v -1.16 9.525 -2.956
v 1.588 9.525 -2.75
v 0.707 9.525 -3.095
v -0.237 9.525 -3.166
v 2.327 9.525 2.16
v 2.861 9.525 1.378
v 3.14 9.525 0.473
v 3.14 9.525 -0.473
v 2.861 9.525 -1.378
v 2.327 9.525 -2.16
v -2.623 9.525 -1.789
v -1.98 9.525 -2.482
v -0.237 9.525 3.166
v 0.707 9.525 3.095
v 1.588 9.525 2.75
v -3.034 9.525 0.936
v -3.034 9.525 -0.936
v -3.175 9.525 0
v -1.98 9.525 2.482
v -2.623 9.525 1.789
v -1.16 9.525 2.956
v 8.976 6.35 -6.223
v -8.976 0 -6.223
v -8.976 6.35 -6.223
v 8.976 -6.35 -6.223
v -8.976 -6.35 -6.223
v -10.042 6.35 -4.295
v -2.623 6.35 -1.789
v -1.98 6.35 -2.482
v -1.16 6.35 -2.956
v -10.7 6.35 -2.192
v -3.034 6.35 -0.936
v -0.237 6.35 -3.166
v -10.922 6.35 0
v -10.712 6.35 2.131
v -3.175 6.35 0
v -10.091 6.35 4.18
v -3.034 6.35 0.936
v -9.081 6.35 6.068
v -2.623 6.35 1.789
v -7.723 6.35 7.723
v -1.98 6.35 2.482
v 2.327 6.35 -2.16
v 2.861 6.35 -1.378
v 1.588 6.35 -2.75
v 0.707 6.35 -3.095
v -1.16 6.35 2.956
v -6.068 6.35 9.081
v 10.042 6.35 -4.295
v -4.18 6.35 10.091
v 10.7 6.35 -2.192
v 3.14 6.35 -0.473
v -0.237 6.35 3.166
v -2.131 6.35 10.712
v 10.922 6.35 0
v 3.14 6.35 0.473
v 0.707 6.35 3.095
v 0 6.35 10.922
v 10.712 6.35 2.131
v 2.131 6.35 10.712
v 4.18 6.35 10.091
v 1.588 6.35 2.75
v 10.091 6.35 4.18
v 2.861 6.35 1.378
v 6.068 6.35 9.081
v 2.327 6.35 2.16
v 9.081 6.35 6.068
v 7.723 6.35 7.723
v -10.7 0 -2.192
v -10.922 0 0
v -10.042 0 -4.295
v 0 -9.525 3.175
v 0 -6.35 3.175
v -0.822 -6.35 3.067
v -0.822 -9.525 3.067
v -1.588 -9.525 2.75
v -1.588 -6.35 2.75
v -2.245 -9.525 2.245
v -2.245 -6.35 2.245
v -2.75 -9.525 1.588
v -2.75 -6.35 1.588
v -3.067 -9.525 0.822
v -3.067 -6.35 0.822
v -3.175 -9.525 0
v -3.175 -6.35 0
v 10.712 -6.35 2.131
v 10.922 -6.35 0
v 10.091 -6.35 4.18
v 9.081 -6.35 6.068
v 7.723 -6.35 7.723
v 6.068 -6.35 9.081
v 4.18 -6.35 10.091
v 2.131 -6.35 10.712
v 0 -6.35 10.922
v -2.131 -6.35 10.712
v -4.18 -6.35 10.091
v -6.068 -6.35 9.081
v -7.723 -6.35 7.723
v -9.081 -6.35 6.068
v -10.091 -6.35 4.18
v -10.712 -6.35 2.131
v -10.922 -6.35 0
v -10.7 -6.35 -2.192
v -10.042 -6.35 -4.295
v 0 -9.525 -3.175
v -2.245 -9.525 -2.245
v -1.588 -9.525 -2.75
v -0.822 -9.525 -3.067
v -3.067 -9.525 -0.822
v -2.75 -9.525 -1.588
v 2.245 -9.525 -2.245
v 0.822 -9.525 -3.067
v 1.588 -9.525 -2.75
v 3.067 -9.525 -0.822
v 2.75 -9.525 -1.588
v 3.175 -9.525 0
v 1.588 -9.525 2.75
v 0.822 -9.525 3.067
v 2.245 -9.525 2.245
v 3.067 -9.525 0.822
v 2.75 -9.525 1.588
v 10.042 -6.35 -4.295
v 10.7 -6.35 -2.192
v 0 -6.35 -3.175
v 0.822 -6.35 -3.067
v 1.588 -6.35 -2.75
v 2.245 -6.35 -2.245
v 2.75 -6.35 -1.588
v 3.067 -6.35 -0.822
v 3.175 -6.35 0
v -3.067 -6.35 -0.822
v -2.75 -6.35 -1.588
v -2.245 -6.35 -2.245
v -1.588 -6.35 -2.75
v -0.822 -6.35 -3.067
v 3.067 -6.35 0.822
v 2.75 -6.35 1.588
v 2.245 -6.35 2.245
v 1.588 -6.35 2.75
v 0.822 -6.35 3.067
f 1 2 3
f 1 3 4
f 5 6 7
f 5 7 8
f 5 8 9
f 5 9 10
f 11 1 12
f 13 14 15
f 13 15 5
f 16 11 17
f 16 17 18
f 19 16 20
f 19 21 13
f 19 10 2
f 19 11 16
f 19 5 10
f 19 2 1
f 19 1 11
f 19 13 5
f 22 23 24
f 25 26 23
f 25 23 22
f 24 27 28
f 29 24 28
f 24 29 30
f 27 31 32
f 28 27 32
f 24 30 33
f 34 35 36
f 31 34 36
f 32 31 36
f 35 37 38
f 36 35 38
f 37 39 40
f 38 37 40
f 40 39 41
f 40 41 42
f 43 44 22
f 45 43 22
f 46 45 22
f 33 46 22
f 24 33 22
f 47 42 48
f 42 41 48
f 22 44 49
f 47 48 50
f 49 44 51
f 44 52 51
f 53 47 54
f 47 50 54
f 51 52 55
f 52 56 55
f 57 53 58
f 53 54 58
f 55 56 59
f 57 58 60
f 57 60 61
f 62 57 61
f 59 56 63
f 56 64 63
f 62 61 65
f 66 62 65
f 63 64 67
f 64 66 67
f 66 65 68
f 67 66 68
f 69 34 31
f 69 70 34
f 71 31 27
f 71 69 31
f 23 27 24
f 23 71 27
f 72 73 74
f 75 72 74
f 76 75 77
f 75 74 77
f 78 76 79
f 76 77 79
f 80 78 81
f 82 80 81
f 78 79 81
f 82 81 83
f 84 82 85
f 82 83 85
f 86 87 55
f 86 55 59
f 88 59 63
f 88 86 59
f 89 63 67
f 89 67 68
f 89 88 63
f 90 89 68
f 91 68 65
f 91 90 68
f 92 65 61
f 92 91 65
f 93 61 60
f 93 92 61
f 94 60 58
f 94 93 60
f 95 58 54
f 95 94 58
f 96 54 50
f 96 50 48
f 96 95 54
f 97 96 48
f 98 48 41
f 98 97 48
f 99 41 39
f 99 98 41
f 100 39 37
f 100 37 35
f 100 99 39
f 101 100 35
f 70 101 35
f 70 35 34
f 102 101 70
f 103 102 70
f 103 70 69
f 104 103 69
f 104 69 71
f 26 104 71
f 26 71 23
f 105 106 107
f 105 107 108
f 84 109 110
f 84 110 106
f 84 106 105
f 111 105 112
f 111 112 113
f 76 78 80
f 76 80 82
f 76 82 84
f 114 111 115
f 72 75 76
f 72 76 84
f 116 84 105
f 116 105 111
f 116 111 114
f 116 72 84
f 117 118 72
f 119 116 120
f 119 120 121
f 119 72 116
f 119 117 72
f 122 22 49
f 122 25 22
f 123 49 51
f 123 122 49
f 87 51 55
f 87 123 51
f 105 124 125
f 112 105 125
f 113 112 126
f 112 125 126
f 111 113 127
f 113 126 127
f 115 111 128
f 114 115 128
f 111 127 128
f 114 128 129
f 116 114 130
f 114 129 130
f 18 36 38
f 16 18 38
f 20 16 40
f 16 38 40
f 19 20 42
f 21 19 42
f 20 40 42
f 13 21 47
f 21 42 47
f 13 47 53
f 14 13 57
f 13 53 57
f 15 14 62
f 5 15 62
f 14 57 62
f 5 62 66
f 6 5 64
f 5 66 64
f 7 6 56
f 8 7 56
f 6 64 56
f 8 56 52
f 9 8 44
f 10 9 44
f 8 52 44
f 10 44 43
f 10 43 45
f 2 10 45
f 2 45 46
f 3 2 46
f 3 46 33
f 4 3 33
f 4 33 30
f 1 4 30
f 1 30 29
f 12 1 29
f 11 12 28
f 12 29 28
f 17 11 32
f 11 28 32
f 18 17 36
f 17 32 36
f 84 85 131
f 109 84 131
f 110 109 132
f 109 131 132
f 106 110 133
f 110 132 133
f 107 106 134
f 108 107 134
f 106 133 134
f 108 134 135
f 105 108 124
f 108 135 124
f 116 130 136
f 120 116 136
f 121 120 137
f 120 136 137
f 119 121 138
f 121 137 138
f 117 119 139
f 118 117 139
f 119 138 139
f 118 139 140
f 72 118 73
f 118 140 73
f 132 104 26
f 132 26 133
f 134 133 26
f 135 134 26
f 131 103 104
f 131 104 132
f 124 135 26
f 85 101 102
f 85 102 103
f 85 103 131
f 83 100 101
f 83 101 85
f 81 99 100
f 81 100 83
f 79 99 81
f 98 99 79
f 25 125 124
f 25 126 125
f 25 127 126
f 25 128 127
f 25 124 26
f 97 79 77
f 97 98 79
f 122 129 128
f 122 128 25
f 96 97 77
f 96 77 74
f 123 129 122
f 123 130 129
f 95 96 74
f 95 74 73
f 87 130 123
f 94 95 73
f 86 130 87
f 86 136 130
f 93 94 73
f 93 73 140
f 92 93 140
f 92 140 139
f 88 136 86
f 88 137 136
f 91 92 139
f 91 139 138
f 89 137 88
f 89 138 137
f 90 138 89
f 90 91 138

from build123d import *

# Parameters (mm, degrees)
F1_DEPTH = 6.35
F3_DEPTH = 3.175
F4_R     = 3.175
F5_DEPTH = 3.175


with BuildPart() as f1:
    # F0 (on Front) → F1 (new body, symmetric)
    with BuildSketch(Plane.XZ):
        with BuildLine():
            Line((0, 10.922), (0, 0))
            Line((0, 0), (10.922, 0))
            ThreePointArc((10.922, 0), (7.7230202641, 7.7230202641), (0, 10.922))
        make_face()
        with BuildLine():
            Line((10.922, 0), (0, 0))
            Line((0, 0), (0, -6.223))
            Line((0, -6.223), (8.9757648699, -6.223))
            ThreePointArc((8.9757648699, -6.223), (10.4240919966, -3.2601211704), (10.922, 0))
        make_face()
        with BuildLine():
            ThreePointArc((0, 10.922), (-7.7230202641, 7.7230202641), (-10.922, 0))
            Line((-10.922, 0), (0, 0))
            Line((0, 0), (0, 10.922))
        make_face()
        with BuildLine():
            Line((0, 0), (-10.922, 0))
            ThreePointArc((-10.922, 0), (-10.4240919966, -3.2601211704), (-8.9757648699, -6.223))
            Line((-8.9757648699, -6.223), (0, -6.223))
            Line((0, -6.223), (0, 0))
        make_face()
    extrude(amount=F1_DEPTH, both=True)

    # F2 (on face) → F3 (join)
    with BuildSketch(Plane.XZ.offset(6.35)):
        with BuildLine():
            Line((3.175, 0), (0, 0))
            Line((0, 0), (0, -3.175))
            ThreePointArc((0, -3.175), (2.2450640303, -2.2450640303), (3.175, 0))
        make_face()
        with BuildLine():
            Line((0, 3.175), (0, 0))
            Line((0, 0), (3.175, 0))
            ThreePointArc((3.175, 0), (2.2450640303, 2.2450640303), (0, 3.175))
        make_face()
        with BuildLine():
            ThreePointArc((0, 3.175), (-2.2450640303, 2.2450640303), (-3.175, 0))
            Line((-3.175, 0), (0, 0))
            Line((0, 0), (0, 3.175))
        make_face()
        with BuildLine():
            Line((0, 0), (-3.175, 0))
            ThreePointArc((-3.175, 0), (-2.2450640303, -2.2450640303), (0, -3.175))
            Line((0, -3.175), (0, 0))
        make_face()
    extrude(amount=F3_DEPTH)

    # F4 (on face) → F5 (join)
    with BuildSketch(Plane(origin=(0, 6.35, 0), x_dir=(-1, 0, 0), z_dir=(0, 1, 0))):
        Circle(F4_R)
    extrude(amount=F5_DEPTH)


solid = f1.part
